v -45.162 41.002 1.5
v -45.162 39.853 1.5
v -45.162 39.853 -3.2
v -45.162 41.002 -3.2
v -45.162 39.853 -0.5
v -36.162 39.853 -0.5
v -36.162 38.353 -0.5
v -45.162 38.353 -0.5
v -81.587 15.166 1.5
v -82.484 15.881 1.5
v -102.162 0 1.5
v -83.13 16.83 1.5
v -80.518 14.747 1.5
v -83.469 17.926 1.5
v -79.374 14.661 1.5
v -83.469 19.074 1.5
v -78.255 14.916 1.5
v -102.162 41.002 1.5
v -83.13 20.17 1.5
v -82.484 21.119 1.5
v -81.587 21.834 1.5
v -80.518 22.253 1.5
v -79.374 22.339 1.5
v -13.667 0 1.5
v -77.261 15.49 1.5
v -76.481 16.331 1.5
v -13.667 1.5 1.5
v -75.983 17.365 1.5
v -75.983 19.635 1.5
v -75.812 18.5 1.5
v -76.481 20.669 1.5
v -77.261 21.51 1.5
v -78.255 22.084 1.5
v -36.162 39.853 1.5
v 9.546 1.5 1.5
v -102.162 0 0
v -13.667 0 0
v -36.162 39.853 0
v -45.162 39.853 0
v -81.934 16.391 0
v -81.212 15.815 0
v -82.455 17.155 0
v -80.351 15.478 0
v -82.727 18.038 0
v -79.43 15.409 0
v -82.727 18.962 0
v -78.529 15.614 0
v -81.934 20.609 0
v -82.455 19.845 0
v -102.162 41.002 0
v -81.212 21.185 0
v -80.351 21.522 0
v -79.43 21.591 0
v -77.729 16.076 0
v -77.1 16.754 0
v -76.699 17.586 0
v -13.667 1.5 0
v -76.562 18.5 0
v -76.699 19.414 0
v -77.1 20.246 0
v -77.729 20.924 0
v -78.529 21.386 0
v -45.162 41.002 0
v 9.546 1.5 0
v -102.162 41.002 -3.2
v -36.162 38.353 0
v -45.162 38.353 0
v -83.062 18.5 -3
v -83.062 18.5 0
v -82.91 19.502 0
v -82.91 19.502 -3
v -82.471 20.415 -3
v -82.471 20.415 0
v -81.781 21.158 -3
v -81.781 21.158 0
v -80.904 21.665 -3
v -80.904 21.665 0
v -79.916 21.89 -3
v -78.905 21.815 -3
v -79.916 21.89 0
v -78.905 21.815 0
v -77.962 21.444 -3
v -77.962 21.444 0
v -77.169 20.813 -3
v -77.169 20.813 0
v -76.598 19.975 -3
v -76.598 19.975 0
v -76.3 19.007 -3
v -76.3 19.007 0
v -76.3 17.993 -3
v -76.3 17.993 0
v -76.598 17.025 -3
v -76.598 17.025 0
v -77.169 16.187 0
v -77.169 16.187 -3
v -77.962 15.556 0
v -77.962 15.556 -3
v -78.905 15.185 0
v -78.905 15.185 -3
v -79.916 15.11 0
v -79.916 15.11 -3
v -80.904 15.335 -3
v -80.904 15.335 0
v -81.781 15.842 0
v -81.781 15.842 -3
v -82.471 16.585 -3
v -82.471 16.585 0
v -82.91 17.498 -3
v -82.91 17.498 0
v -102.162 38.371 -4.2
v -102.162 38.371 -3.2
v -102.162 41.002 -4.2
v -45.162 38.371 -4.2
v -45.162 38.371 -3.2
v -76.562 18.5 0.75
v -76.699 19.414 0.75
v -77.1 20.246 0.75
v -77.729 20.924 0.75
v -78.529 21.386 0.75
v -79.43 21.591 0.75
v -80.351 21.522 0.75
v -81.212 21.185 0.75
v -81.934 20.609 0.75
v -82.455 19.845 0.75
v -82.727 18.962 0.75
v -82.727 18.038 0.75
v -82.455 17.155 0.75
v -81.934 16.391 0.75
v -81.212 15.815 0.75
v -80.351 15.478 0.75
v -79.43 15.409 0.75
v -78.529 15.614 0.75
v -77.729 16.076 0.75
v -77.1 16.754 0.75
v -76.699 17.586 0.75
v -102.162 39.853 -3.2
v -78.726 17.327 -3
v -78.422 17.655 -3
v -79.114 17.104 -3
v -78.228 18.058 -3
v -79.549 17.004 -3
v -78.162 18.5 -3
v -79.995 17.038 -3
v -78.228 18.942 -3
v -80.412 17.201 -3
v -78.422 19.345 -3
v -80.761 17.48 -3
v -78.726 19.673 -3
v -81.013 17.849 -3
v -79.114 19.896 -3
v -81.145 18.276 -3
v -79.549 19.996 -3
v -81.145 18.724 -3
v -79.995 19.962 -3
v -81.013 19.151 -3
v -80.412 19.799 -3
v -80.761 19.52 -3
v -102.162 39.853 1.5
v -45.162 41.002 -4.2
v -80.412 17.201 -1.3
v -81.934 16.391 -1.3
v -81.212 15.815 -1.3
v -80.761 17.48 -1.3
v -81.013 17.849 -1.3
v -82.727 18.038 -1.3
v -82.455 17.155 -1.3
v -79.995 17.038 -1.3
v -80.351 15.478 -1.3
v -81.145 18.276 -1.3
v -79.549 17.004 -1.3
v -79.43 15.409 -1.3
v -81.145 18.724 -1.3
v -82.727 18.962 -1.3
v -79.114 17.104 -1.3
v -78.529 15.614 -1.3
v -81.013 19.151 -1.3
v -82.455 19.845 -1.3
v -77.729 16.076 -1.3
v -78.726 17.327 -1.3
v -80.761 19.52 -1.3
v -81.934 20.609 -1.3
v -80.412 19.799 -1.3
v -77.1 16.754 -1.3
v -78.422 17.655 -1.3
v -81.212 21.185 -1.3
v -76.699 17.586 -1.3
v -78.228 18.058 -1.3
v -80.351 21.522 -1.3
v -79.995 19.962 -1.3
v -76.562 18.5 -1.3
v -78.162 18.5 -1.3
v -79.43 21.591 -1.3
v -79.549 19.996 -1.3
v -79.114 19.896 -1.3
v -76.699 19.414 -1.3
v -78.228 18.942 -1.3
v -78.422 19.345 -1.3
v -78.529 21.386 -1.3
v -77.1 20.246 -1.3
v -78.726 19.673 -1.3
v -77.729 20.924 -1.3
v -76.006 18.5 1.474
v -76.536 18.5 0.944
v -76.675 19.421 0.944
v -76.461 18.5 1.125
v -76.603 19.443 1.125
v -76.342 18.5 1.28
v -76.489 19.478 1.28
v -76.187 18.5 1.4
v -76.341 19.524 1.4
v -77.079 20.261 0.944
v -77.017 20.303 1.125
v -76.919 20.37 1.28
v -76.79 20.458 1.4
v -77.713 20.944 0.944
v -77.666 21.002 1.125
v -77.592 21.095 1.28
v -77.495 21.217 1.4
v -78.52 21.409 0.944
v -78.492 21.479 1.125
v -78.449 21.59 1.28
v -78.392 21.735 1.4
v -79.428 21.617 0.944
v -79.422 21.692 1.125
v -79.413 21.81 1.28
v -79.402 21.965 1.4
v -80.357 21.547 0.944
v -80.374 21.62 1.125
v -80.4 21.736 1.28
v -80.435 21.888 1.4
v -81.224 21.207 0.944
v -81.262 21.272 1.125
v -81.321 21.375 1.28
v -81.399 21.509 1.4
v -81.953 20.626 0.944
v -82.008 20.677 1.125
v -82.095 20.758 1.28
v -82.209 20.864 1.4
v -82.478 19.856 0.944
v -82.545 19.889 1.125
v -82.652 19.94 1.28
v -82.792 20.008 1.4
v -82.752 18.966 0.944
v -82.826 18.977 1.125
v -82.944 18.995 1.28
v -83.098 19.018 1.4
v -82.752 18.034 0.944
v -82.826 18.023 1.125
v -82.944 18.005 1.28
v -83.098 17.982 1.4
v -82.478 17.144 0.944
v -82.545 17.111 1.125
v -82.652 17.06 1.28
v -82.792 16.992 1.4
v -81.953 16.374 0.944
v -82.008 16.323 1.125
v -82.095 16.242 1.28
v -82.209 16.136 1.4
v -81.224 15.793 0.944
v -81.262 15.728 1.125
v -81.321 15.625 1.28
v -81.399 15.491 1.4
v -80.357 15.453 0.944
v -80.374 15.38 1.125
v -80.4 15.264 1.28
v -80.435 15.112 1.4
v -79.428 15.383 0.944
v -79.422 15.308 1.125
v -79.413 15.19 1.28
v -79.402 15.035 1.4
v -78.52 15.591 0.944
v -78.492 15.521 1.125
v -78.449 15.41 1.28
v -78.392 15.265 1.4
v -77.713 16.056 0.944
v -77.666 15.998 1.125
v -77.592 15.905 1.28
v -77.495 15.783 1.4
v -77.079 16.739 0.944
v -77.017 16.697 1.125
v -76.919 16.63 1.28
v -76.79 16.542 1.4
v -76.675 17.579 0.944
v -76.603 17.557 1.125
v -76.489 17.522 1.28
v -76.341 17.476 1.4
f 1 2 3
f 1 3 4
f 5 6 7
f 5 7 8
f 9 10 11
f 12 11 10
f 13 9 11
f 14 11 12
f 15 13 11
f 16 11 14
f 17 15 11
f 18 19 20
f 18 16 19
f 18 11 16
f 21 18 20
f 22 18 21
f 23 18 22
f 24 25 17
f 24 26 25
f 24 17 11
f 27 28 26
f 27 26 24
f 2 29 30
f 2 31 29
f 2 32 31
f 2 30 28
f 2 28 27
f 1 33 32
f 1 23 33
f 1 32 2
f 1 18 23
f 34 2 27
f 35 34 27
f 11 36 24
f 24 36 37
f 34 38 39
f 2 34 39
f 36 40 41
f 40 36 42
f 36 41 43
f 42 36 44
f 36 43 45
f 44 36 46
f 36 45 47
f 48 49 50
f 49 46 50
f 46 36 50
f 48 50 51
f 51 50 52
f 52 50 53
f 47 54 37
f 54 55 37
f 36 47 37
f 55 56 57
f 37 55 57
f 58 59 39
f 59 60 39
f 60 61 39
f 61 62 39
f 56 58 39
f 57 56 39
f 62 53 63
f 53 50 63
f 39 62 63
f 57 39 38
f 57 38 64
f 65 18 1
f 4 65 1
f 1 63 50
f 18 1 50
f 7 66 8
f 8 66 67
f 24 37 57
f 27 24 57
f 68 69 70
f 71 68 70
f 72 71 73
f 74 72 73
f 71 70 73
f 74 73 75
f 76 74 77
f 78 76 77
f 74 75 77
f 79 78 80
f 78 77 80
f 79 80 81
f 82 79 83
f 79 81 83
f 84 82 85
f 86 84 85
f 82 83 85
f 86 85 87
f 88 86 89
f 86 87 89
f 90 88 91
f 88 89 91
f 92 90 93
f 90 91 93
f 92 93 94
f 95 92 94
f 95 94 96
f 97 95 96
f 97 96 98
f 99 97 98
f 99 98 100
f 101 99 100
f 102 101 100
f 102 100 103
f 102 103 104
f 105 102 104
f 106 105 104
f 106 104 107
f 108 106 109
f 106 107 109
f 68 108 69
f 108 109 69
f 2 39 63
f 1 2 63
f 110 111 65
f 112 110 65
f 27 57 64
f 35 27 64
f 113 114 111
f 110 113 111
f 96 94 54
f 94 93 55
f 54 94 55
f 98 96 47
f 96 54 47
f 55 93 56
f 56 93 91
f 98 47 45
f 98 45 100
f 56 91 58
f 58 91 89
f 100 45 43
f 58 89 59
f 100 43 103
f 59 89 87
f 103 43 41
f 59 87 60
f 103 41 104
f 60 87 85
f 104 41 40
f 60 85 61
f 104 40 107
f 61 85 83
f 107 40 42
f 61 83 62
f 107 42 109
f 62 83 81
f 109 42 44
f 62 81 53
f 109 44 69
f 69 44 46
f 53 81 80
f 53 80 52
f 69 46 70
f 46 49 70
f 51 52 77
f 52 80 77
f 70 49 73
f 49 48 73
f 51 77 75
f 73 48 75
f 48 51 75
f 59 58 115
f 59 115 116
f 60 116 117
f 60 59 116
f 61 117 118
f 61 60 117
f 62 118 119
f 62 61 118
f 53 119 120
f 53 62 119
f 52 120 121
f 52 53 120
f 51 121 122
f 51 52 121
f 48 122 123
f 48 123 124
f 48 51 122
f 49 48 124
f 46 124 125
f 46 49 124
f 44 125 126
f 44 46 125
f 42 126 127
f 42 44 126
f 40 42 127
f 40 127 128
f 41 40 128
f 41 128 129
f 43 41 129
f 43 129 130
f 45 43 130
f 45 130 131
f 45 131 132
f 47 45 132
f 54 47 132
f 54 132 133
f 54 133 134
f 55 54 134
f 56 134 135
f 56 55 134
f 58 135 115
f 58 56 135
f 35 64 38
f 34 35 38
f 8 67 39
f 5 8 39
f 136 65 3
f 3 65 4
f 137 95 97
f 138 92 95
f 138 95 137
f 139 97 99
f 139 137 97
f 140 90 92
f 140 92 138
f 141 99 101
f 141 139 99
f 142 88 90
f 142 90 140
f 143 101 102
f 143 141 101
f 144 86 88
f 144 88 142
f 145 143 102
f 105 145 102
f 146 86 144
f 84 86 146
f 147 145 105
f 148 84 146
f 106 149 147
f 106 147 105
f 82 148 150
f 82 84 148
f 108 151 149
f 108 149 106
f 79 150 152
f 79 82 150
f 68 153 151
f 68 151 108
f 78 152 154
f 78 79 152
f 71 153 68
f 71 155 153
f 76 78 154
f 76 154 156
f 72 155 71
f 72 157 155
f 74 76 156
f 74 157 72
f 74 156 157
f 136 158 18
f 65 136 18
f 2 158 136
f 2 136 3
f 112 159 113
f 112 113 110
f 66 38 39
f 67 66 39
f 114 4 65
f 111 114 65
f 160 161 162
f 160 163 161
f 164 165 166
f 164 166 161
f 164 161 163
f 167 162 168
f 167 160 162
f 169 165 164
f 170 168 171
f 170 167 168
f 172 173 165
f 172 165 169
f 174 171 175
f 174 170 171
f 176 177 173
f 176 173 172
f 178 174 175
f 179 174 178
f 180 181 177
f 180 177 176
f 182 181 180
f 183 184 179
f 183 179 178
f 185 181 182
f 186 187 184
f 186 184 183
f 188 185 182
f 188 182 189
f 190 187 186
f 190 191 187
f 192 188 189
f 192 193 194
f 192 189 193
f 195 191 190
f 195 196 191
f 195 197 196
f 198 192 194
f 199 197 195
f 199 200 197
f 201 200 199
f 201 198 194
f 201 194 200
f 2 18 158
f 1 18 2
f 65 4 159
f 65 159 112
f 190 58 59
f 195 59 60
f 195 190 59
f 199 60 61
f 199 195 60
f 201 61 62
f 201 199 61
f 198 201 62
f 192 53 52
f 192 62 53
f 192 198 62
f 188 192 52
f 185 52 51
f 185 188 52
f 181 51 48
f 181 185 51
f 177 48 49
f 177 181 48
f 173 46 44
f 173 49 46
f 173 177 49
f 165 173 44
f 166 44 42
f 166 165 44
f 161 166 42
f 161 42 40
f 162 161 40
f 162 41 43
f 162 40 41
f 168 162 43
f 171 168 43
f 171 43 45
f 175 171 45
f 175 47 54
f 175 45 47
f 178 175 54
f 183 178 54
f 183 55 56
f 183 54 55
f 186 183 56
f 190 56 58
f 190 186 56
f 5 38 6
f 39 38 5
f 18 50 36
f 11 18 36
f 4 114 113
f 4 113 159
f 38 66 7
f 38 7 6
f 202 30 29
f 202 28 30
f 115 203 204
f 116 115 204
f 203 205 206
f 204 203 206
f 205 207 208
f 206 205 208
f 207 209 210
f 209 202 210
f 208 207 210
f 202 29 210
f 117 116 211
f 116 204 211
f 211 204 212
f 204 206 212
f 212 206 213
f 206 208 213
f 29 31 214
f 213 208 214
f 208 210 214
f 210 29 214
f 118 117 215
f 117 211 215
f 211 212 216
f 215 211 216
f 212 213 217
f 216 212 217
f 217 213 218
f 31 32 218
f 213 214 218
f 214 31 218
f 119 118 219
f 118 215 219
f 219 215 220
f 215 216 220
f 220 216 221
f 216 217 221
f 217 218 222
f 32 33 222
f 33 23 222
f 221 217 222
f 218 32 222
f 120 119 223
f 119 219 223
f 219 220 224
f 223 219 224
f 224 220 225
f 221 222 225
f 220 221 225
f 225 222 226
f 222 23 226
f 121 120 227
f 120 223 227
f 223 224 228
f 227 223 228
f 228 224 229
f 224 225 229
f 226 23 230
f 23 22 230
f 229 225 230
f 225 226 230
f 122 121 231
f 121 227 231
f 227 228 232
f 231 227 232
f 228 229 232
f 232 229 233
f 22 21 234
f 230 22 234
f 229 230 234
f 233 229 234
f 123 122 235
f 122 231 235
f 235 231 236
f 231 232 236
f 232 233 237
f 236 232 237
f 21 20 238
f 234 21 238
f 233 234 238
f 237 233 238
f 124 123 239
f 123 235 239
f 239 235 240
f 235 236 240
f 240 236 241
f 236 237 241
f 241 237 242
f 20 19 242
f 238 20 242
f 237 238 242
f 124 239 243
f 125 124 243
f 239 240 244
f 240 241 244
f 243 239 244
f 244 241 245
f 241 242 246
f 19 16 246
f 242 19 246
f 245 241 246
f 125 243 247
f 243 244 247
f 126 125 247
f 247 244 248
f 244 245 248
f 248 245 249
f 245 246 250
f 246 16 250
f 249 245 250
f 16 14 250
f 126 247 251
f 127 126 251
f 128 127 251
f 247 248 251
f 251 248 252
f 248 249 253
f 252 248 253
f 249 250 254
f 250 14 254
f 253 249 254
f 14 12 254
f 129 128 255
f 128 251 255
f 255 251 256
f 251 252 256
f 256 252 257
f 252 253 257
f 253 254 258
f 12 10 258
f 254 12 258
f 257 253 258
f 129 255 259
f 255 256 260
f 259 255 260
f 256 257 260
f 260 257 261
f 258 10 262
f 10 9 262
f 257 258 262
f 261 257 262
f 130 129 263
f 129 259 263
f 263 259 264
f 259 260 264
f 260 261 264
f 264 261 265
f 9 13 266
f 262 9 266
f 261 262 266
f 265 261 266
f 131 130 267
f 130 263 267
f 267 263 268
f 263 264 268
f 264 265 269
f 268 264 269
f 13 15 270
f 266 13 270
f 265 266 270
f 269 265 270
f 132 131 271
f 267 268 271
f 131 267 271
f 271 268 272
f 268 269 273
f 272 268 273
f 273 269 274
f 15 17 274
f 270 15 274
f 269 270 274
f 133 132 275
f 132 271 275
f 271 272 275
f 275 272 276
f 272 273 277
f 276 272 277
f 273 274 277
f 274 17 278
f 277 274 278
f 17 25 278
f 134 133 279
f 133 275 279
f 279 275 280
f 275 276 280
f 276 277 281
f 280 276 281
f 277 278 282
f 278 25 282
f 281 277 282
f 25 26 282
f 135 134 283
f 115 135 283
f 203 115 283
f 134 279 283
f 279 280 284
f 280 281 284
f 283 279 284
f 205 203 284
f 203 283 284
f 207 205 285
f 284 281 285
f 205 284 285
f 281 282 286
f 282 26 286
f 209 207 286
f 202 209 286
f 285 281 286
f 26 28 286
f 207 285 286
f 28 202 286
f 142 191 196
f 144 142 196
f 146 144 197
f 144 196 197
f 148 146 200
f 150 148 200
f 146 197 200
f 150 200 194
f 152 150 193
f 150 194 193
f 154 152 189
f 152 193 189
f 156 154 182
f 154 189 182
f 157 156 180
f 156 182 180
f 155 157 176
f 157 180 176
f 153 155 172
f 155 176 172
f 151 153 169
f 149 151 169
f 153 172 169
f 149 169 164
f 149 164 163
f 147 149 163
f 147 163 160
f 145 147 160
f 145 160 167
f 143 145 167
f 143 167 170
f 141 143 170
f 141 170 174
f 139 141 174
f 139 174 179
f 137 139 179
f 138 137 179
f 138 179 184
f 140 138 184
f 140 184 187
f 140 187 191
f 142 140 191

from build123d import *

# Parameters (mm, degrees)
SKETCH_2_R          = 3.1
EXTRUDE_11_DEPTH    = 1.5
SKETCH_6_R          = 3.4
EXTRUDE_12_DEPTH    = 3
SKETCH_7_W          = 57
SKETCH_7_H          = 1.149066665
EXTRUDE_13_DEPTH    = 4.7
SKETCH_10_W         = 8.999999995
SKETCH_10_H         = 1.5
EXTRUDE_15_DEPTH    = 0.5
SKETCH_11_W         = 57
SKETCH_11_H         = 2.63042276
EXTRUDE_17_DEPTH    = 1
SKETCH_13_R         = 1.5
CUT_EXTRUDE_1_DEPTH = 3
CUT_EXTRUDE_START   = -2.8
SKETCH_14_R         = 3.1
CUT_EXTRUDE_2_DEPTH = 2.8
FILLET_1_R          = 0.75


with BuildPart() as part:
    # Эскиз2 → Бобышка-Вытянуть11 (new body)
    with BuildSketch(Plane.XY):
        Polygon((-13.66679287, 0), (-13.66679287, 1.5), (9.54557674, 1.5), (-36.161548345, 39.852831801), (-45.16154834, 39.852831801), (-45.16154834, 41.001898466), (-100.16154834, 41.001898466), (-102.16154834, 41.001898466), (-102.16154834, 0), (-99.16154834, 0), align=None)
        with Locations((-79.66154834, 18.5)):
            Circle(SKETCH_2_R, mode=Mode.SUBTRACT)
    extrude(amount=EXTRUDE_11_DEPTH)

    # Скругление1
    fillet_1_edges = [part.edges().sort_by_distance(p)[0] for p in [
        (-82.76154834, 18.5, 1.5),
    ]]
    fillet(fillet_1_edges, radius=FILLET_1_R)


with BuildPart() as body_2:
    # Эскиз6 → Бобышка-Вытянуть12 (new body)
    with BuildSketch(Plane(origin=(0, 0, 0), x_dir=(-1, 0, 0), z_dir=(0, 0, -1))):
        with Locations((79.66154834, 18.5)):
            Circle(SKETCH_6_R)
    extrude(amount=EXTRUDE_12_DEPTH)

    # Эскиз13 → Вырез-Вытянуть1 (cut)
    with BuildSketch(Plane.XY):
        with Locations((-79.66154834, 18.5)):
            Circle(SKETCH_13_R)
    extrude(amount=-CUT_EXTRUDE_1_DEPTH, mode=Mode.SUBTRACT)

    # Эскиз14 → Вырез-Вытянуть2 (cut)
    with BuildSketch(Plane.XY.offset(1.5).offset(CUT_EXTRUDE_START)):
        with Locations((-79.66154834, 18.5)):
            Circle(SKETCH_14_R)
    extrude(amount=CUT_EXTRUDE_2_DEPTH, mode=Mode.SUBTRACT)


with BuildPart() as body_3:
    # Эскиз7 → Бобышка-Вытянуть13 (new body)
    with BuildSketch(Plane.XY.offset(1.5)):
        with Locations((-73.66154834, 40.427365134)):
            Rectangle(SKETCH_7_W, SKETCH_7_H)
    extrude(amount=-EXTRUDE_13_DEPTH)


with BuildPart() as body_4:
    # Эскиз10 → Бобышка-Вытянуть15 (new body)
    with BuildSketch(Plane(origin=(0, 0, 0), x_dir=(-1, 0, 0), z_dir=(0, 0, -1))):
        with Locations((40.661548342, 39.102831801)):
            Rectangle(SKETCH_10_W, SKETCH_10_H)
    extrude(amount=EXTRUDE_15_DEPTH)


with BuildPart() as body_5:
    # Эскиз11 → Бобышка-Вытянуть17 (new body)
    with BuildSketch(Plane(origin=(0, 0, -3.2), x_dir=(-1, 0, 0), z_dir=(0, 0, -1))):
        with Locations((73.66154834, 39.686687086)):
            Rectangle(SKETCH_11_W, SKETCH_11_H)
    extrude(amount=EXTRUDE_17_DEPTH)


solid = Compound([part.part, body_2.part, body_3.part, body_4.part, body_5.part])
